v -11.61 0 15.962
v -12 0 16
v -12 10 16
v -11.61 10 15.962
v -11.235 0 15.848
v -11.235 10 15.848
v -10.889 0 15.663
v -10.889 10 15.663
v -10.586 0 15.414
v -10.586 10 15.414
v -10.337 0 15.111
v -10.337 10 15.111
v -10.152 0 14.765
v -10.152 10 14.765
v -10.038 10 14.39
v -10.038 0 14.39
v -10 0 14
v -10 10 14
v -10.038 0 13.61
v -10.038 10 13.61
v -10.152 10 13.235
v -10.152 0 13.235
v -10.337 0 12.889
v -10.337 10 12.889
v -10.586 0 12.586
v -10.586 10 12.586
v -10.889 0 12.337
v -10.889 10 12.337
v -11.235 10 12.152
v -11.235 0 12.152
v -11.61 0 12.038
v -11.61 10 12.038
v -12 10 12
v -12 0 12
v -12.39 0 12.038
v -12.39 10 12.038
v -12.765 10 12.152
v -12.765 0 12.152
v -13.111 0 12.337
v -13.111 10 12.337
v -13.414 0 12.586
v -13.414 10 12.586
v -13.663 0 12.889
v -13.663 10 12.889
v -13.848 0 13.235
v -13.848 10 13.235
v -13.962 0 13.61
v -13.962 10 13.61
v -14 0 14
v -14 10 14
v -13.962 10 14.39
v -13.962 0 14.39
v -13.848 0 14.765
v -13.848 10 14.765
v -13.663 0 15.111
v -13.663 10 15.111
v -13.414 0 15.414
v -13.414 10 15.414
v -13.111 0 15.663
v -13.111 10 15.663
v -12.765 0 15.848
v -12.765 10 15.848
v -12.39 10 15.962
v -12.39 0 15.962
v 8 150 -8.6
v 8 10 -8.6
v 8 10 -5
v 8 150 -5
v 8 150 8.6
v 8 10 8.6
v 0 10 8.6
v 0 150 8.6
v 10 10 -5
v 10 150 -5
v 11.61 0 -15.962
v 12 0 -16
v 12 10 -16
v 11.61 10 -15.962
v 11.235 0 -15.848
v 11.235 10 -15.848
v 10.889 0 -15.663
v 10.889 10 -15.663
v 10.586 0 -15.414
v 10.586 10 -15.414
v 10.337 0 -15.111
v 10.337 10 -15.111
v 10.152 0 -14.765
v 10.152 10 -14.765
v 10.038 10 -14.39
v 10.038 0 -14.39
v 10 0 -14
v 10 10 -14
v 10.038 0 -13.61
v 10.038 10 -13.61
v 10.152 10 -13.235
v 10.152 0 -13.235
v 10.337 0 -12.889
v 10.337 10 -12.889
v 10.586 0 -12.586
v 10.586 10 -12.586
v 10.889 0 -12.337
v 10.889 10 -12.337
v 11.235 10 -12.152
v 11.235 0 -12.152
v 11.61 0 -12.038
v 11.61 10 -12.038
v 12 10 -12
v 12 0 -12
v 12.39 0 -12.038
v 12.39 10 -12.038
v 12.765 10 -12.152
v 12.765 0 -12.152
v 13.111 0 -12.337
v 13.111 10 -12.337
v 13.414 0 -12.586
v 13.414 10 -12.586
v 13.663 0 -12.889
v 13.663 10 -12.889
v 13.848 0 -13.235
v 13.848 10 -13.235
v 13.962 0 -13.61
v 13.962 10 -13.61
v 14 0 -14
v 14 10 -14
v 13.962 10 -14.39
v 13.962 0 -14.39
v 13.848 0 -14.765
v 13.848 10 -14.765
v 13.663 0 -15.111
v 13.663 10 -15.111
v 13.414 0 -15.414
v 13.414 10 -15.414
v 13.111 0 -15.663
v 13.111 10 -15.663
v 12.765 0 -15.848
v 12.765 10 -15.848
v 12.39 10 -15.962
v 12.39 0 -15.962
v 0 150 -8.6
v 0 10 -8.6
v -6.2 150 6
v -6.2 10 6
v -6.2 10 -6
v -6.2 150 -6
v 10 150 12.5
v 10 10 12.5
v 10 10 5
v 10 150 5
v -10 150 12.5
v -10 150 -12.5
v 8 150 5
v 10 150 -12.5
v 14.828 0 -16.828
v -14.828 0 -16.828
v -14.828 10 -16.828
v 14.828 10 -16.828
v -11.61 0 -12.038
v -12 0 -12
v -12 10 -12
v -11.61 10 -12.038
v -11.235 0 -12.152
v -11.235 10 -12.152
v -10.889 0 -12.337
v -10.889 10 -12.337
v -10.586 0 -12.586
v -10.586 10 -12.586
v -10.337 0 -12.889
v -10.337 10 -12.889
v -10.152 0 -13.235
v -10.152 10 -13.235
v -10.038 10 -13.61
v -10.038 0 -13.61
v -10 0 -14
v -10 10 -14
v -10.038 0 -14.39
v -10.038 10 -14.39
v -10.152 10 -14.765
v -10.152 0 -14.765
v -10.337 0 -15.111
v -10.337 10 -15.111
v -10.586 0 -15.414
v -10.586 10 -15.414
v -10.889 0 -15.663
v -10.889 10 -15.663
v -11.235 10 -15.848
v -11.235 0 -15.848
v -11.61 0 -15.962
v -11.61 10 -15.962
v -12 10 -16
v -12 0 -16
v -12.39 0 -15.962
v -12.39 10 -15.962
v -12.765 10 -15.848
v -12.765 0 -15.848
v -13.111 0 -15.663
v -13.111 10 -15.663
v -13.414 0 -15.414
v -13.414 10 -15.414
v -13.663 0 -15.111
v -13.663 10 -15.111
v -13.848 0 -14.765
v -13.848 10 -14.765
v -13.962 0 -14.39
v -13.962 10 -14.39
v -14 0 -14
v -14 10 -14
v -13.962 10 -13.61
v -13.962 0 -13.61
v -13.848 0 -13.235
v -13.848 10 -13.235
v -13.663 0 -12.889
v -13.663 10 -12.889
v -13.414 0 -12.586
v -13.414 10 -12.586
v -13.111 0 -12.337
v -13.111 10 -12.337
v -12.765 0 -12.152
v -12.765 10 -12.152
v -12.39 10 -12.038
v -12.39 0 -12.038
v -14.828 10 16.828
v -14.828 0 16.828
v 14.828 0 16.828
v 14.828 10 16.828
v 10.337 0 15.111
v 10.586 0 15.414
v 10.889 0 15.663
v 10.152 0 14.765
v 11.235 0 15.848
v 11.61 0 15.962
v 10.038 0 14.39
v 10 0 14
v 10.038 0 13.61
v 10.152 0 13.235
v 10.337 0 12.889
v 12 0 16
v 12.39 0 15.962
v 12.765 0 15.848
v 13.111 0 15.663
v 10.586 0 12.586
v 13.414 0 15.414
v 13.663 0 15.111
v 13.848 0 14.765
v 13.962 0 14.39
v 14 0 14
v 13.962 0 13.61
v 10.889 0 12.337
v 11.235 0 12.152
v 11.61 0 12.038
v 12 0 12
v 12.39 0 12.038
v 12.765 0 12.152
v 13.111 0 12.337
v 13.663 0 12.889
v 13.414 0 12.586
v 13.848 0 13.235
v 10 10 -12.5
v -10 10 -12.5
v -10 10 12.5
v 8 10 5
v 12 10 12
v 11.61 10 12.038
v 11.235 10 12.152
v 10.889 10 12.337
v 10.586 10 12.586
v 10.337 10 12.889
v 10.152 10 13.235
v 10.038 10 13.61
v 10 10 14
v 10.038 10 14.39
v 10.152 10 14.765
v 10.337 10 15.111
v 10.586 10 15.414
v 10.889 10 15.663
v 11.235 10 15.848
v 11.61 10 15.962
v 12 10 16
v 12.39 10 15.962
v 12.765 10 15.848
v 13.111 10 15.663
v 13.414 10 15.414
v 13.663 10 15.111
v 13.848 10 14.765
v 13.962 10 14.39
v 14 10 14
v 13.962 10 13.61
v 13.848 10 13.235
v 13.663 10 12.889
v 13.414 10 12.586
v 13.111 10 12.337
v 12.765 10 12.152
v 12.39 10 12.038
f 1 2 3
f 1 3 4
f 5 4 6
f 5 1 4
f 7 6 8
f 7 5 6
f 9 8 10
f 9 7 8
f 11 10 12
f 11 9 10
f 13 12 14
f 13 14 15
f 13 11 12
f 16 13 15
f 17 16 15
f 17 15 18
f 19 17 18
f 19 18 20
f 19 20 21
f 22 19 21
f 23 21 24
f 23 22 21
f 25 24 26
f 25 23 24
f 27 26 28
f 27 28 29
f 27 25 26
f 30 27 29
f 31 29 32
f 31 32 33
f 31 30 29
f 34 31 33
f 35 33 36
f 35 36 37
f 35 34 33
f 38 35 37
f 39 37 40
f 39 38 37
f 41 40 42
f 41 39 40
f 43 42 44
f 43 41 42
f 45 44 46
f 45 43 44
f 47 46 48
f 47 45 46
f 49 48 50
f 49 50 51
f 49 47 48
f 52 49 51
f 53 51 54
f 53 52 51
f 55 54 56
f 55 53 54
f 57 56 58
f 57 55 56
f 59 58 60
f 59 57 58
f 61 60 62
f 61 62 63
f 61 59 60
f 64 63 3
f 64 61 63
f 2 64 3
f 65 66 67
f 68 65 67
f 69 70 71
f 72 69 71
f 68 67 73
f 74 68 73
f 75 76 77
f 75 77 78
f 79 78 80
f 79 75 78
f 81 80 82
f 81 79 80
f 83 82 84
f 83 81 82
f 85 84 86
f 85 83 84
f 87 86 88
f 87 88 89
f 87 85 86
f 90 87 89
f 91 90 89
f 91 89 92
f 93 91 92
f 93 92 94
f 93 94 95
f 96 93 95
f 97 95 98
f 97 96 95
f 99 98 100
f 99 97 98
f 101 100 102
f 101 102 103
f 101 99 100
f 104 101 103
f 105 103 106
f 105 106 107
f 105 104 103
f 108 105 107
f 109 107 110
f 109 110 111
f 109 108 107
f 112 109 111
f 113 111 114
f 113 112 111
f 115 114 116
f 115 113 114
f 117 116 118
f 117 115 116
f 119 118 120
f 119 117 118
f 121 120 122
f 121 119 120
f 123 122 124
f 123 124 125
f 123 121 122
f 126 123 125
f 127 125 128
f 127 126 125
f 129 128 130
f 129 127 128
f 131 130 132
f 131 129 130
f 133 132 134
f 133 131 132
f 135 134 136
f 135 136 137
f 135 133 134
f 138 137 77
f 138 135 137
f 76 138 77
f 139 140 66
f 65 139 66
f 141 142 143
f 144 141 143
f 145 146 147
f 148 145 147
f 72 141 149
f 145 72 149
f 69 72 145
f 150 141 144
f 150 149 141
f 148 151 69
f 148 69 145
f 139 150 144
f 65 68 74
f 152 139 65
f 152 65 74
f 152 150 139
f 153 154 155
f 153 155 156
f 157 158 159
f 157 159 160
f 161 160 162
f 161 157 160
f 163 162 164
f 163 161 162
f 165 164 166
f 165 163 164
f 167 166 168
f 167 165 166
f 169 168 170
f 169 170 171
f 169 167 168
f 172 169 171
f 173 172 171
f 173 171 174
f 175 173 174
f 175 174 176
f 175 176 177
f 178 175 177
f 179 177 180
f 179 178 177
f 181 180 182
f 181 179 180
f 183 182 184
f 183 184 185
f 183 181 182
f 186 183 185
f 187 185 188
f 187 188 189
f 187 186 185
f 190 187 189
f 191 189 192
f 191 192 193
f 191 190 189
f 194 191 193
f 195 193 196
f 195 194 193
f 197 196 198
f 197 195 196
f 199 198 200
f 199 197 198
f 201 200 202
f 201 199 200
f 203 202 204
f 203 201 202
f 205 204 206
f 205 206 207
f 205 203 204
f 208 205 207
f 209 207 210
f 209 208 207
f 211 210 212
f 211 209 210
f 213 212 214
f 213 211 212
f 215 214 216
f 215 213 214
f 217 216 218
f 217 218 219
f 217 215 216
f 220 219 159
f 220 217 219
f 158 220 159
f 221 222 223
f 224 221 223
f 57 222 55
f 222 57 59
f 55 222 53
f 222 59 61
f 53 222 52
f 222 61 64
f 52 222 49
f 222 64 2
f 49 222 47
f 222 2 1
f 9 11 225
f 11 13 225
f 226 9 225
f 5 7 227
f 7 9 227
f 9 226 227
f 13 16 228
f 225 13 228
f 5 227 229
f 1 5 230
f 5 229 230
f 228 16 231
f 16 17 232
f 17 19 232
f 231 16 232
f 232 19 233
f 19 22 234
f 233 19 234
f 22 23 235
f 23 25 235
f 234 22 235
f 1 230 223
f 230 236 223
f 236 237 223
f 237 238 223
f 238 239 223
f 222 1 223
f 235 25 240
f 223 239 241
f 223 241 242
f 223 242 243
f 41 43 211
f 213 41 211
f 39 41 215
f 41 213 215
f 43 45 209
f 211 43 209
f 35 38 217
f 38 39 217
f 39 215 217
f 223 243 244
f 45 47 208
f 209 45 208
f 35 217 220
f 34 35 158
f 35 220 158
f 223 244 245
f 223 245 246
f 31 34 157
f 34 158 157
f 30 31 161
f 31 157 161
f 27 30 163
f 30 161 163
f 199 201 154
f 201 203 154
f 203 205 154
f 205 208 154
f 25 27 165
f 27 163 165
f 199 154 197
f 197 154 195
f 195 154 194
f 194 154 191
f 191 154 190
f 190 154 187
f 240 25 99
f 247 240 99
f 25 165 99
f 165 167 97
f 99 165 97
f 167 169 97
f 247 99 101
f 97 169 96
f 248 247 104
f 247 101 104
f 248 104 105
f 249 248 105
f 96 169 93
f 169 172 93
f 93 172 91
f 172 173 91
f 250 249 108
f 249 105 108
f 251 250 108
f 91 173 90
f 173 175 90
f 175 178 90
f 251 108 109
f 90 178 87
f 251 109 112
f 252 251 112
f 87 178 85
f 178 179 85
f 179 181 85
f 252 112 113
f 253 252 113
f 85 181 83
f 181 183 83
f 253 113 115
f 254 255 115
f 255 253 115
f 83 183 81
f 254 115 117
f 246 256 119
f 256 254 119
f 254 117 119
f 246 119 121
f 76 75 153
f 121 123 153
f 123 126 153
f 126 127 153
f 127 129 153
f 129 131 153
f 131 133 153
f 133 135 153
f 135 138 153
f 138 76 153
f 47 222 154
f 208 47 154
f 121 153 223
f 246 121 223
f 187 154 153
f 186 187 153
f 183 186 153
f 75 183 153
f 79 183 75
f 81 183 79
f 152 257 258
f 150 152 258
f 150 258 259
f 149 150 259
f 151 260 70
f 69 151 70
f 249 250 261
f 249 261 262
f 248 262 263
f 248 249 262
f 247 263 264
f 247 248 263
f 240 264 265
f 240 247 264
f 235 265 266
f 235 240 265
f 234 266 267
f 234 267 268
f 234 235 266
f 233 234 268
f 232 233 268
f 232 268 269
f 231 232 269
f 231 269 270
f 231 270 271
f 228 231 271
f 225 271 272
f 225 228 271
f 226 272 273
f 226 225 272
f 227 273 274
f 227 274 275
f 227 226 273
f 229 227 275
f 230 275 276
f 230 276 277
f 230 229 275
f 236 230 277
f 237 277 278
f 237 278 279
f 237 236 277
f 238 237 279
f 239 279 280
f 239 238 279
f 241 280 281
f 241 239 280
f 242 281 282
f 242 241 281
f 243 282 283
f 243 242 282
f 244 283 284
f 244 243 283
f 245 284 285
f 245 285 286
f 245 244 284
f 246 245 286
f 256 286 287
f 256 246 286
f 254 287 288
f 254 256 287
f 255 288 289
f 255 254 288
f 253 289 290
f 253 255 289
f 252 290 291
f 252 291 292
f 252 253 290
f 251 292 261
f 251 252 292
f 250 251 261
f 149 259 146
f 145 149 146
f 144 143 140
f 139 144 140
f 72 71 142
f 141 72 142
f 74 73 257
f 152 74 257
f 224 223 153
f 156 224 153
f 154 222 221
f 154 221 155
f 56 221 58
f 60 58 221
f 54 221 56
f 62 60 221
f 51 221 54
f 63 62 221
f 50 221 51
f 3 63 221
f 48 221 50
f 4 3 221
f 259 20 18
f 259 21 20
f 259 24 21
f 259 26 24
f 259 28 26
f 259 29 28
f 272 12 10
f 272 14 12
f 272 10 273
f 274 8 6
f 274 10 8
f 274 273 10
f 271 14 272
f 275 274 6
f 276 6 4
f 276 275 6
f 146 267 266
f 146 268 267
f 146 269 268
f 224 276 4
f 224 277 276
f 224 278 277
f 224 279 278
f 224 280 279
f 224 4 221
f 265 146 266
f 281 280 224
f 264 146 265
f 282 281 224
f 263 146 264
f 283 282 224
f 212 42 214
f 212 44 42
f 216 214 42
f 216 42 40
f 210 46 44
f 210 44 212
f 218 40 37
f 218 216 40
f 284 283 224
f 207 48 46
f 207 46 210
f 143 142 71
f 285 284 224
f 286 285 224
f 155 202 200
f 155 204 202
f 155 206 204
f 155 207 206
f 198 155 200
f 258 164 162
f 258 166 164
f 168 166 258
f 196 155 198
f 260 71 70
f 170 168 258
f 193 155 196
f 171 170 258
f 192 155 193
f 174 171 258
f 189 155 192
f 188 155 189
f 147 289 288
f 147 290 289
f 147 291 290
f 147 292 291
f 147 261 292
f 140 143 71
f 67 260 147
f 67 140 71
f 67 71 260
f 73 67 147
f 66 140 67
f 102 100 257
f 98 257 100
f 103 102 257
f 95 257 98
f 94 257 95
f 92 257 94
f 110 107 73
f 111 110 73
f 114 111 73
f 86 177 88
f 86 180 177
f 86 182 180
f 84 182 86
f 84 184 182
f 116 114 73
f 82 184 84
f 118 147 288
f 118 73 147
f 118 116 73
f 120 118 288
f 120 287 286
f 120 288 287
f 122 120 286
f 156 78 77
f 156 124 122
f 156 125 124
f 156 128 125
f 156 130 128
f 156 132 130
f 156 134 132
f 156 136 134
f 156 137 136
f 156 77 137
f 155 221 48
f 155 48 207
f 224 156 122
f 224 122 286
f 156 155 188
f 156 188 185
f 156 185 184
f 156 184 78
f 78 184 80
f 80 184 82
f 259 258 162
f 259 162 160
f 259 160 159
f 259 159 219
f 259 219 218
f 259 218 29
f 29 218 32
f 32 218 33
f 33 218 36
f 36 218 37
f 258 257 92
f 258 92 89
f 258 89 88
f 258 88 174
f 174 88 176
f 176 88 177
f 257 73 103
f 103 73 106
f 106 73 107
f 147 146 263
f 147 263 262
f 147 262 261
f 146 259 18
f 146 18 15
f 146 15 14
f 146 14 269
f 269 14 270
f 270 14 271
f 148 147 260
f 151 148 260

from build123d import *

# Parameters (mm, degrees)
BOSS_EXTRUDE2_DEPTH = 150
SKETCH3_W           = 29.65685425
SKETCH3_H           = 33.65685425
SKETCH3_R           = 2
BOSS_EXTRUDE3_DEPTH = 10


with BuildPart() as part:
    # Sketch1 → Boss-Extrude2 (new body)
    with BuildSketch(Plane(origin=(0, 0, 0), x_dir=(1, 0, 0), z_dir=(0, 1, 0))):
        Polygon((-10, 12.5), (-10, -12.5), (10, -12.5), (10, -5), (8, -5), (8, -8.6), (0, -8.6), (-6.2, -6), (-6.2, 0), (-6.2, 6), (0, 8.6), (8, 8.6), (8, 5), (10, 5), (10, 12.5), align=None)
    extrude(amount=BOSS_EXTRUDE2_DEPTH)

    # Sketch3 → Boss-Extrude3 (add)
    with BuildSketch(Plane(origin=(0, 0, 0), x_dir=(1, 0, 0), z_dir=(0, 1, 0))):
        Rectangle(SKETCH3_W, SKETCH3_H)
        with Locations(Location((-12, 14, 0), (0, 0, 270))):
            Circle(SKETCH3_R, mode=Mode.SUBTRACT)
        with Locations(Location((-12, -14, 0), (0, 0, 270))):
            Circle(SKETCH3_R, mode=Mode.SUBTRACT)
        with Locations(Location((12, 14, 0), (0, 0, 90))):
            Circle(SKETCH3_R, mode=Mode.SUBTRACT)
        with Locations(Location((12, -14, 0), (0, 0, 90))):
            Circle(SKETCH3_R, mode=Mode.SUBTRACT)
    extrude(amount=BOSS_EXTRUDE3_DEPTH)


solid = part.part
